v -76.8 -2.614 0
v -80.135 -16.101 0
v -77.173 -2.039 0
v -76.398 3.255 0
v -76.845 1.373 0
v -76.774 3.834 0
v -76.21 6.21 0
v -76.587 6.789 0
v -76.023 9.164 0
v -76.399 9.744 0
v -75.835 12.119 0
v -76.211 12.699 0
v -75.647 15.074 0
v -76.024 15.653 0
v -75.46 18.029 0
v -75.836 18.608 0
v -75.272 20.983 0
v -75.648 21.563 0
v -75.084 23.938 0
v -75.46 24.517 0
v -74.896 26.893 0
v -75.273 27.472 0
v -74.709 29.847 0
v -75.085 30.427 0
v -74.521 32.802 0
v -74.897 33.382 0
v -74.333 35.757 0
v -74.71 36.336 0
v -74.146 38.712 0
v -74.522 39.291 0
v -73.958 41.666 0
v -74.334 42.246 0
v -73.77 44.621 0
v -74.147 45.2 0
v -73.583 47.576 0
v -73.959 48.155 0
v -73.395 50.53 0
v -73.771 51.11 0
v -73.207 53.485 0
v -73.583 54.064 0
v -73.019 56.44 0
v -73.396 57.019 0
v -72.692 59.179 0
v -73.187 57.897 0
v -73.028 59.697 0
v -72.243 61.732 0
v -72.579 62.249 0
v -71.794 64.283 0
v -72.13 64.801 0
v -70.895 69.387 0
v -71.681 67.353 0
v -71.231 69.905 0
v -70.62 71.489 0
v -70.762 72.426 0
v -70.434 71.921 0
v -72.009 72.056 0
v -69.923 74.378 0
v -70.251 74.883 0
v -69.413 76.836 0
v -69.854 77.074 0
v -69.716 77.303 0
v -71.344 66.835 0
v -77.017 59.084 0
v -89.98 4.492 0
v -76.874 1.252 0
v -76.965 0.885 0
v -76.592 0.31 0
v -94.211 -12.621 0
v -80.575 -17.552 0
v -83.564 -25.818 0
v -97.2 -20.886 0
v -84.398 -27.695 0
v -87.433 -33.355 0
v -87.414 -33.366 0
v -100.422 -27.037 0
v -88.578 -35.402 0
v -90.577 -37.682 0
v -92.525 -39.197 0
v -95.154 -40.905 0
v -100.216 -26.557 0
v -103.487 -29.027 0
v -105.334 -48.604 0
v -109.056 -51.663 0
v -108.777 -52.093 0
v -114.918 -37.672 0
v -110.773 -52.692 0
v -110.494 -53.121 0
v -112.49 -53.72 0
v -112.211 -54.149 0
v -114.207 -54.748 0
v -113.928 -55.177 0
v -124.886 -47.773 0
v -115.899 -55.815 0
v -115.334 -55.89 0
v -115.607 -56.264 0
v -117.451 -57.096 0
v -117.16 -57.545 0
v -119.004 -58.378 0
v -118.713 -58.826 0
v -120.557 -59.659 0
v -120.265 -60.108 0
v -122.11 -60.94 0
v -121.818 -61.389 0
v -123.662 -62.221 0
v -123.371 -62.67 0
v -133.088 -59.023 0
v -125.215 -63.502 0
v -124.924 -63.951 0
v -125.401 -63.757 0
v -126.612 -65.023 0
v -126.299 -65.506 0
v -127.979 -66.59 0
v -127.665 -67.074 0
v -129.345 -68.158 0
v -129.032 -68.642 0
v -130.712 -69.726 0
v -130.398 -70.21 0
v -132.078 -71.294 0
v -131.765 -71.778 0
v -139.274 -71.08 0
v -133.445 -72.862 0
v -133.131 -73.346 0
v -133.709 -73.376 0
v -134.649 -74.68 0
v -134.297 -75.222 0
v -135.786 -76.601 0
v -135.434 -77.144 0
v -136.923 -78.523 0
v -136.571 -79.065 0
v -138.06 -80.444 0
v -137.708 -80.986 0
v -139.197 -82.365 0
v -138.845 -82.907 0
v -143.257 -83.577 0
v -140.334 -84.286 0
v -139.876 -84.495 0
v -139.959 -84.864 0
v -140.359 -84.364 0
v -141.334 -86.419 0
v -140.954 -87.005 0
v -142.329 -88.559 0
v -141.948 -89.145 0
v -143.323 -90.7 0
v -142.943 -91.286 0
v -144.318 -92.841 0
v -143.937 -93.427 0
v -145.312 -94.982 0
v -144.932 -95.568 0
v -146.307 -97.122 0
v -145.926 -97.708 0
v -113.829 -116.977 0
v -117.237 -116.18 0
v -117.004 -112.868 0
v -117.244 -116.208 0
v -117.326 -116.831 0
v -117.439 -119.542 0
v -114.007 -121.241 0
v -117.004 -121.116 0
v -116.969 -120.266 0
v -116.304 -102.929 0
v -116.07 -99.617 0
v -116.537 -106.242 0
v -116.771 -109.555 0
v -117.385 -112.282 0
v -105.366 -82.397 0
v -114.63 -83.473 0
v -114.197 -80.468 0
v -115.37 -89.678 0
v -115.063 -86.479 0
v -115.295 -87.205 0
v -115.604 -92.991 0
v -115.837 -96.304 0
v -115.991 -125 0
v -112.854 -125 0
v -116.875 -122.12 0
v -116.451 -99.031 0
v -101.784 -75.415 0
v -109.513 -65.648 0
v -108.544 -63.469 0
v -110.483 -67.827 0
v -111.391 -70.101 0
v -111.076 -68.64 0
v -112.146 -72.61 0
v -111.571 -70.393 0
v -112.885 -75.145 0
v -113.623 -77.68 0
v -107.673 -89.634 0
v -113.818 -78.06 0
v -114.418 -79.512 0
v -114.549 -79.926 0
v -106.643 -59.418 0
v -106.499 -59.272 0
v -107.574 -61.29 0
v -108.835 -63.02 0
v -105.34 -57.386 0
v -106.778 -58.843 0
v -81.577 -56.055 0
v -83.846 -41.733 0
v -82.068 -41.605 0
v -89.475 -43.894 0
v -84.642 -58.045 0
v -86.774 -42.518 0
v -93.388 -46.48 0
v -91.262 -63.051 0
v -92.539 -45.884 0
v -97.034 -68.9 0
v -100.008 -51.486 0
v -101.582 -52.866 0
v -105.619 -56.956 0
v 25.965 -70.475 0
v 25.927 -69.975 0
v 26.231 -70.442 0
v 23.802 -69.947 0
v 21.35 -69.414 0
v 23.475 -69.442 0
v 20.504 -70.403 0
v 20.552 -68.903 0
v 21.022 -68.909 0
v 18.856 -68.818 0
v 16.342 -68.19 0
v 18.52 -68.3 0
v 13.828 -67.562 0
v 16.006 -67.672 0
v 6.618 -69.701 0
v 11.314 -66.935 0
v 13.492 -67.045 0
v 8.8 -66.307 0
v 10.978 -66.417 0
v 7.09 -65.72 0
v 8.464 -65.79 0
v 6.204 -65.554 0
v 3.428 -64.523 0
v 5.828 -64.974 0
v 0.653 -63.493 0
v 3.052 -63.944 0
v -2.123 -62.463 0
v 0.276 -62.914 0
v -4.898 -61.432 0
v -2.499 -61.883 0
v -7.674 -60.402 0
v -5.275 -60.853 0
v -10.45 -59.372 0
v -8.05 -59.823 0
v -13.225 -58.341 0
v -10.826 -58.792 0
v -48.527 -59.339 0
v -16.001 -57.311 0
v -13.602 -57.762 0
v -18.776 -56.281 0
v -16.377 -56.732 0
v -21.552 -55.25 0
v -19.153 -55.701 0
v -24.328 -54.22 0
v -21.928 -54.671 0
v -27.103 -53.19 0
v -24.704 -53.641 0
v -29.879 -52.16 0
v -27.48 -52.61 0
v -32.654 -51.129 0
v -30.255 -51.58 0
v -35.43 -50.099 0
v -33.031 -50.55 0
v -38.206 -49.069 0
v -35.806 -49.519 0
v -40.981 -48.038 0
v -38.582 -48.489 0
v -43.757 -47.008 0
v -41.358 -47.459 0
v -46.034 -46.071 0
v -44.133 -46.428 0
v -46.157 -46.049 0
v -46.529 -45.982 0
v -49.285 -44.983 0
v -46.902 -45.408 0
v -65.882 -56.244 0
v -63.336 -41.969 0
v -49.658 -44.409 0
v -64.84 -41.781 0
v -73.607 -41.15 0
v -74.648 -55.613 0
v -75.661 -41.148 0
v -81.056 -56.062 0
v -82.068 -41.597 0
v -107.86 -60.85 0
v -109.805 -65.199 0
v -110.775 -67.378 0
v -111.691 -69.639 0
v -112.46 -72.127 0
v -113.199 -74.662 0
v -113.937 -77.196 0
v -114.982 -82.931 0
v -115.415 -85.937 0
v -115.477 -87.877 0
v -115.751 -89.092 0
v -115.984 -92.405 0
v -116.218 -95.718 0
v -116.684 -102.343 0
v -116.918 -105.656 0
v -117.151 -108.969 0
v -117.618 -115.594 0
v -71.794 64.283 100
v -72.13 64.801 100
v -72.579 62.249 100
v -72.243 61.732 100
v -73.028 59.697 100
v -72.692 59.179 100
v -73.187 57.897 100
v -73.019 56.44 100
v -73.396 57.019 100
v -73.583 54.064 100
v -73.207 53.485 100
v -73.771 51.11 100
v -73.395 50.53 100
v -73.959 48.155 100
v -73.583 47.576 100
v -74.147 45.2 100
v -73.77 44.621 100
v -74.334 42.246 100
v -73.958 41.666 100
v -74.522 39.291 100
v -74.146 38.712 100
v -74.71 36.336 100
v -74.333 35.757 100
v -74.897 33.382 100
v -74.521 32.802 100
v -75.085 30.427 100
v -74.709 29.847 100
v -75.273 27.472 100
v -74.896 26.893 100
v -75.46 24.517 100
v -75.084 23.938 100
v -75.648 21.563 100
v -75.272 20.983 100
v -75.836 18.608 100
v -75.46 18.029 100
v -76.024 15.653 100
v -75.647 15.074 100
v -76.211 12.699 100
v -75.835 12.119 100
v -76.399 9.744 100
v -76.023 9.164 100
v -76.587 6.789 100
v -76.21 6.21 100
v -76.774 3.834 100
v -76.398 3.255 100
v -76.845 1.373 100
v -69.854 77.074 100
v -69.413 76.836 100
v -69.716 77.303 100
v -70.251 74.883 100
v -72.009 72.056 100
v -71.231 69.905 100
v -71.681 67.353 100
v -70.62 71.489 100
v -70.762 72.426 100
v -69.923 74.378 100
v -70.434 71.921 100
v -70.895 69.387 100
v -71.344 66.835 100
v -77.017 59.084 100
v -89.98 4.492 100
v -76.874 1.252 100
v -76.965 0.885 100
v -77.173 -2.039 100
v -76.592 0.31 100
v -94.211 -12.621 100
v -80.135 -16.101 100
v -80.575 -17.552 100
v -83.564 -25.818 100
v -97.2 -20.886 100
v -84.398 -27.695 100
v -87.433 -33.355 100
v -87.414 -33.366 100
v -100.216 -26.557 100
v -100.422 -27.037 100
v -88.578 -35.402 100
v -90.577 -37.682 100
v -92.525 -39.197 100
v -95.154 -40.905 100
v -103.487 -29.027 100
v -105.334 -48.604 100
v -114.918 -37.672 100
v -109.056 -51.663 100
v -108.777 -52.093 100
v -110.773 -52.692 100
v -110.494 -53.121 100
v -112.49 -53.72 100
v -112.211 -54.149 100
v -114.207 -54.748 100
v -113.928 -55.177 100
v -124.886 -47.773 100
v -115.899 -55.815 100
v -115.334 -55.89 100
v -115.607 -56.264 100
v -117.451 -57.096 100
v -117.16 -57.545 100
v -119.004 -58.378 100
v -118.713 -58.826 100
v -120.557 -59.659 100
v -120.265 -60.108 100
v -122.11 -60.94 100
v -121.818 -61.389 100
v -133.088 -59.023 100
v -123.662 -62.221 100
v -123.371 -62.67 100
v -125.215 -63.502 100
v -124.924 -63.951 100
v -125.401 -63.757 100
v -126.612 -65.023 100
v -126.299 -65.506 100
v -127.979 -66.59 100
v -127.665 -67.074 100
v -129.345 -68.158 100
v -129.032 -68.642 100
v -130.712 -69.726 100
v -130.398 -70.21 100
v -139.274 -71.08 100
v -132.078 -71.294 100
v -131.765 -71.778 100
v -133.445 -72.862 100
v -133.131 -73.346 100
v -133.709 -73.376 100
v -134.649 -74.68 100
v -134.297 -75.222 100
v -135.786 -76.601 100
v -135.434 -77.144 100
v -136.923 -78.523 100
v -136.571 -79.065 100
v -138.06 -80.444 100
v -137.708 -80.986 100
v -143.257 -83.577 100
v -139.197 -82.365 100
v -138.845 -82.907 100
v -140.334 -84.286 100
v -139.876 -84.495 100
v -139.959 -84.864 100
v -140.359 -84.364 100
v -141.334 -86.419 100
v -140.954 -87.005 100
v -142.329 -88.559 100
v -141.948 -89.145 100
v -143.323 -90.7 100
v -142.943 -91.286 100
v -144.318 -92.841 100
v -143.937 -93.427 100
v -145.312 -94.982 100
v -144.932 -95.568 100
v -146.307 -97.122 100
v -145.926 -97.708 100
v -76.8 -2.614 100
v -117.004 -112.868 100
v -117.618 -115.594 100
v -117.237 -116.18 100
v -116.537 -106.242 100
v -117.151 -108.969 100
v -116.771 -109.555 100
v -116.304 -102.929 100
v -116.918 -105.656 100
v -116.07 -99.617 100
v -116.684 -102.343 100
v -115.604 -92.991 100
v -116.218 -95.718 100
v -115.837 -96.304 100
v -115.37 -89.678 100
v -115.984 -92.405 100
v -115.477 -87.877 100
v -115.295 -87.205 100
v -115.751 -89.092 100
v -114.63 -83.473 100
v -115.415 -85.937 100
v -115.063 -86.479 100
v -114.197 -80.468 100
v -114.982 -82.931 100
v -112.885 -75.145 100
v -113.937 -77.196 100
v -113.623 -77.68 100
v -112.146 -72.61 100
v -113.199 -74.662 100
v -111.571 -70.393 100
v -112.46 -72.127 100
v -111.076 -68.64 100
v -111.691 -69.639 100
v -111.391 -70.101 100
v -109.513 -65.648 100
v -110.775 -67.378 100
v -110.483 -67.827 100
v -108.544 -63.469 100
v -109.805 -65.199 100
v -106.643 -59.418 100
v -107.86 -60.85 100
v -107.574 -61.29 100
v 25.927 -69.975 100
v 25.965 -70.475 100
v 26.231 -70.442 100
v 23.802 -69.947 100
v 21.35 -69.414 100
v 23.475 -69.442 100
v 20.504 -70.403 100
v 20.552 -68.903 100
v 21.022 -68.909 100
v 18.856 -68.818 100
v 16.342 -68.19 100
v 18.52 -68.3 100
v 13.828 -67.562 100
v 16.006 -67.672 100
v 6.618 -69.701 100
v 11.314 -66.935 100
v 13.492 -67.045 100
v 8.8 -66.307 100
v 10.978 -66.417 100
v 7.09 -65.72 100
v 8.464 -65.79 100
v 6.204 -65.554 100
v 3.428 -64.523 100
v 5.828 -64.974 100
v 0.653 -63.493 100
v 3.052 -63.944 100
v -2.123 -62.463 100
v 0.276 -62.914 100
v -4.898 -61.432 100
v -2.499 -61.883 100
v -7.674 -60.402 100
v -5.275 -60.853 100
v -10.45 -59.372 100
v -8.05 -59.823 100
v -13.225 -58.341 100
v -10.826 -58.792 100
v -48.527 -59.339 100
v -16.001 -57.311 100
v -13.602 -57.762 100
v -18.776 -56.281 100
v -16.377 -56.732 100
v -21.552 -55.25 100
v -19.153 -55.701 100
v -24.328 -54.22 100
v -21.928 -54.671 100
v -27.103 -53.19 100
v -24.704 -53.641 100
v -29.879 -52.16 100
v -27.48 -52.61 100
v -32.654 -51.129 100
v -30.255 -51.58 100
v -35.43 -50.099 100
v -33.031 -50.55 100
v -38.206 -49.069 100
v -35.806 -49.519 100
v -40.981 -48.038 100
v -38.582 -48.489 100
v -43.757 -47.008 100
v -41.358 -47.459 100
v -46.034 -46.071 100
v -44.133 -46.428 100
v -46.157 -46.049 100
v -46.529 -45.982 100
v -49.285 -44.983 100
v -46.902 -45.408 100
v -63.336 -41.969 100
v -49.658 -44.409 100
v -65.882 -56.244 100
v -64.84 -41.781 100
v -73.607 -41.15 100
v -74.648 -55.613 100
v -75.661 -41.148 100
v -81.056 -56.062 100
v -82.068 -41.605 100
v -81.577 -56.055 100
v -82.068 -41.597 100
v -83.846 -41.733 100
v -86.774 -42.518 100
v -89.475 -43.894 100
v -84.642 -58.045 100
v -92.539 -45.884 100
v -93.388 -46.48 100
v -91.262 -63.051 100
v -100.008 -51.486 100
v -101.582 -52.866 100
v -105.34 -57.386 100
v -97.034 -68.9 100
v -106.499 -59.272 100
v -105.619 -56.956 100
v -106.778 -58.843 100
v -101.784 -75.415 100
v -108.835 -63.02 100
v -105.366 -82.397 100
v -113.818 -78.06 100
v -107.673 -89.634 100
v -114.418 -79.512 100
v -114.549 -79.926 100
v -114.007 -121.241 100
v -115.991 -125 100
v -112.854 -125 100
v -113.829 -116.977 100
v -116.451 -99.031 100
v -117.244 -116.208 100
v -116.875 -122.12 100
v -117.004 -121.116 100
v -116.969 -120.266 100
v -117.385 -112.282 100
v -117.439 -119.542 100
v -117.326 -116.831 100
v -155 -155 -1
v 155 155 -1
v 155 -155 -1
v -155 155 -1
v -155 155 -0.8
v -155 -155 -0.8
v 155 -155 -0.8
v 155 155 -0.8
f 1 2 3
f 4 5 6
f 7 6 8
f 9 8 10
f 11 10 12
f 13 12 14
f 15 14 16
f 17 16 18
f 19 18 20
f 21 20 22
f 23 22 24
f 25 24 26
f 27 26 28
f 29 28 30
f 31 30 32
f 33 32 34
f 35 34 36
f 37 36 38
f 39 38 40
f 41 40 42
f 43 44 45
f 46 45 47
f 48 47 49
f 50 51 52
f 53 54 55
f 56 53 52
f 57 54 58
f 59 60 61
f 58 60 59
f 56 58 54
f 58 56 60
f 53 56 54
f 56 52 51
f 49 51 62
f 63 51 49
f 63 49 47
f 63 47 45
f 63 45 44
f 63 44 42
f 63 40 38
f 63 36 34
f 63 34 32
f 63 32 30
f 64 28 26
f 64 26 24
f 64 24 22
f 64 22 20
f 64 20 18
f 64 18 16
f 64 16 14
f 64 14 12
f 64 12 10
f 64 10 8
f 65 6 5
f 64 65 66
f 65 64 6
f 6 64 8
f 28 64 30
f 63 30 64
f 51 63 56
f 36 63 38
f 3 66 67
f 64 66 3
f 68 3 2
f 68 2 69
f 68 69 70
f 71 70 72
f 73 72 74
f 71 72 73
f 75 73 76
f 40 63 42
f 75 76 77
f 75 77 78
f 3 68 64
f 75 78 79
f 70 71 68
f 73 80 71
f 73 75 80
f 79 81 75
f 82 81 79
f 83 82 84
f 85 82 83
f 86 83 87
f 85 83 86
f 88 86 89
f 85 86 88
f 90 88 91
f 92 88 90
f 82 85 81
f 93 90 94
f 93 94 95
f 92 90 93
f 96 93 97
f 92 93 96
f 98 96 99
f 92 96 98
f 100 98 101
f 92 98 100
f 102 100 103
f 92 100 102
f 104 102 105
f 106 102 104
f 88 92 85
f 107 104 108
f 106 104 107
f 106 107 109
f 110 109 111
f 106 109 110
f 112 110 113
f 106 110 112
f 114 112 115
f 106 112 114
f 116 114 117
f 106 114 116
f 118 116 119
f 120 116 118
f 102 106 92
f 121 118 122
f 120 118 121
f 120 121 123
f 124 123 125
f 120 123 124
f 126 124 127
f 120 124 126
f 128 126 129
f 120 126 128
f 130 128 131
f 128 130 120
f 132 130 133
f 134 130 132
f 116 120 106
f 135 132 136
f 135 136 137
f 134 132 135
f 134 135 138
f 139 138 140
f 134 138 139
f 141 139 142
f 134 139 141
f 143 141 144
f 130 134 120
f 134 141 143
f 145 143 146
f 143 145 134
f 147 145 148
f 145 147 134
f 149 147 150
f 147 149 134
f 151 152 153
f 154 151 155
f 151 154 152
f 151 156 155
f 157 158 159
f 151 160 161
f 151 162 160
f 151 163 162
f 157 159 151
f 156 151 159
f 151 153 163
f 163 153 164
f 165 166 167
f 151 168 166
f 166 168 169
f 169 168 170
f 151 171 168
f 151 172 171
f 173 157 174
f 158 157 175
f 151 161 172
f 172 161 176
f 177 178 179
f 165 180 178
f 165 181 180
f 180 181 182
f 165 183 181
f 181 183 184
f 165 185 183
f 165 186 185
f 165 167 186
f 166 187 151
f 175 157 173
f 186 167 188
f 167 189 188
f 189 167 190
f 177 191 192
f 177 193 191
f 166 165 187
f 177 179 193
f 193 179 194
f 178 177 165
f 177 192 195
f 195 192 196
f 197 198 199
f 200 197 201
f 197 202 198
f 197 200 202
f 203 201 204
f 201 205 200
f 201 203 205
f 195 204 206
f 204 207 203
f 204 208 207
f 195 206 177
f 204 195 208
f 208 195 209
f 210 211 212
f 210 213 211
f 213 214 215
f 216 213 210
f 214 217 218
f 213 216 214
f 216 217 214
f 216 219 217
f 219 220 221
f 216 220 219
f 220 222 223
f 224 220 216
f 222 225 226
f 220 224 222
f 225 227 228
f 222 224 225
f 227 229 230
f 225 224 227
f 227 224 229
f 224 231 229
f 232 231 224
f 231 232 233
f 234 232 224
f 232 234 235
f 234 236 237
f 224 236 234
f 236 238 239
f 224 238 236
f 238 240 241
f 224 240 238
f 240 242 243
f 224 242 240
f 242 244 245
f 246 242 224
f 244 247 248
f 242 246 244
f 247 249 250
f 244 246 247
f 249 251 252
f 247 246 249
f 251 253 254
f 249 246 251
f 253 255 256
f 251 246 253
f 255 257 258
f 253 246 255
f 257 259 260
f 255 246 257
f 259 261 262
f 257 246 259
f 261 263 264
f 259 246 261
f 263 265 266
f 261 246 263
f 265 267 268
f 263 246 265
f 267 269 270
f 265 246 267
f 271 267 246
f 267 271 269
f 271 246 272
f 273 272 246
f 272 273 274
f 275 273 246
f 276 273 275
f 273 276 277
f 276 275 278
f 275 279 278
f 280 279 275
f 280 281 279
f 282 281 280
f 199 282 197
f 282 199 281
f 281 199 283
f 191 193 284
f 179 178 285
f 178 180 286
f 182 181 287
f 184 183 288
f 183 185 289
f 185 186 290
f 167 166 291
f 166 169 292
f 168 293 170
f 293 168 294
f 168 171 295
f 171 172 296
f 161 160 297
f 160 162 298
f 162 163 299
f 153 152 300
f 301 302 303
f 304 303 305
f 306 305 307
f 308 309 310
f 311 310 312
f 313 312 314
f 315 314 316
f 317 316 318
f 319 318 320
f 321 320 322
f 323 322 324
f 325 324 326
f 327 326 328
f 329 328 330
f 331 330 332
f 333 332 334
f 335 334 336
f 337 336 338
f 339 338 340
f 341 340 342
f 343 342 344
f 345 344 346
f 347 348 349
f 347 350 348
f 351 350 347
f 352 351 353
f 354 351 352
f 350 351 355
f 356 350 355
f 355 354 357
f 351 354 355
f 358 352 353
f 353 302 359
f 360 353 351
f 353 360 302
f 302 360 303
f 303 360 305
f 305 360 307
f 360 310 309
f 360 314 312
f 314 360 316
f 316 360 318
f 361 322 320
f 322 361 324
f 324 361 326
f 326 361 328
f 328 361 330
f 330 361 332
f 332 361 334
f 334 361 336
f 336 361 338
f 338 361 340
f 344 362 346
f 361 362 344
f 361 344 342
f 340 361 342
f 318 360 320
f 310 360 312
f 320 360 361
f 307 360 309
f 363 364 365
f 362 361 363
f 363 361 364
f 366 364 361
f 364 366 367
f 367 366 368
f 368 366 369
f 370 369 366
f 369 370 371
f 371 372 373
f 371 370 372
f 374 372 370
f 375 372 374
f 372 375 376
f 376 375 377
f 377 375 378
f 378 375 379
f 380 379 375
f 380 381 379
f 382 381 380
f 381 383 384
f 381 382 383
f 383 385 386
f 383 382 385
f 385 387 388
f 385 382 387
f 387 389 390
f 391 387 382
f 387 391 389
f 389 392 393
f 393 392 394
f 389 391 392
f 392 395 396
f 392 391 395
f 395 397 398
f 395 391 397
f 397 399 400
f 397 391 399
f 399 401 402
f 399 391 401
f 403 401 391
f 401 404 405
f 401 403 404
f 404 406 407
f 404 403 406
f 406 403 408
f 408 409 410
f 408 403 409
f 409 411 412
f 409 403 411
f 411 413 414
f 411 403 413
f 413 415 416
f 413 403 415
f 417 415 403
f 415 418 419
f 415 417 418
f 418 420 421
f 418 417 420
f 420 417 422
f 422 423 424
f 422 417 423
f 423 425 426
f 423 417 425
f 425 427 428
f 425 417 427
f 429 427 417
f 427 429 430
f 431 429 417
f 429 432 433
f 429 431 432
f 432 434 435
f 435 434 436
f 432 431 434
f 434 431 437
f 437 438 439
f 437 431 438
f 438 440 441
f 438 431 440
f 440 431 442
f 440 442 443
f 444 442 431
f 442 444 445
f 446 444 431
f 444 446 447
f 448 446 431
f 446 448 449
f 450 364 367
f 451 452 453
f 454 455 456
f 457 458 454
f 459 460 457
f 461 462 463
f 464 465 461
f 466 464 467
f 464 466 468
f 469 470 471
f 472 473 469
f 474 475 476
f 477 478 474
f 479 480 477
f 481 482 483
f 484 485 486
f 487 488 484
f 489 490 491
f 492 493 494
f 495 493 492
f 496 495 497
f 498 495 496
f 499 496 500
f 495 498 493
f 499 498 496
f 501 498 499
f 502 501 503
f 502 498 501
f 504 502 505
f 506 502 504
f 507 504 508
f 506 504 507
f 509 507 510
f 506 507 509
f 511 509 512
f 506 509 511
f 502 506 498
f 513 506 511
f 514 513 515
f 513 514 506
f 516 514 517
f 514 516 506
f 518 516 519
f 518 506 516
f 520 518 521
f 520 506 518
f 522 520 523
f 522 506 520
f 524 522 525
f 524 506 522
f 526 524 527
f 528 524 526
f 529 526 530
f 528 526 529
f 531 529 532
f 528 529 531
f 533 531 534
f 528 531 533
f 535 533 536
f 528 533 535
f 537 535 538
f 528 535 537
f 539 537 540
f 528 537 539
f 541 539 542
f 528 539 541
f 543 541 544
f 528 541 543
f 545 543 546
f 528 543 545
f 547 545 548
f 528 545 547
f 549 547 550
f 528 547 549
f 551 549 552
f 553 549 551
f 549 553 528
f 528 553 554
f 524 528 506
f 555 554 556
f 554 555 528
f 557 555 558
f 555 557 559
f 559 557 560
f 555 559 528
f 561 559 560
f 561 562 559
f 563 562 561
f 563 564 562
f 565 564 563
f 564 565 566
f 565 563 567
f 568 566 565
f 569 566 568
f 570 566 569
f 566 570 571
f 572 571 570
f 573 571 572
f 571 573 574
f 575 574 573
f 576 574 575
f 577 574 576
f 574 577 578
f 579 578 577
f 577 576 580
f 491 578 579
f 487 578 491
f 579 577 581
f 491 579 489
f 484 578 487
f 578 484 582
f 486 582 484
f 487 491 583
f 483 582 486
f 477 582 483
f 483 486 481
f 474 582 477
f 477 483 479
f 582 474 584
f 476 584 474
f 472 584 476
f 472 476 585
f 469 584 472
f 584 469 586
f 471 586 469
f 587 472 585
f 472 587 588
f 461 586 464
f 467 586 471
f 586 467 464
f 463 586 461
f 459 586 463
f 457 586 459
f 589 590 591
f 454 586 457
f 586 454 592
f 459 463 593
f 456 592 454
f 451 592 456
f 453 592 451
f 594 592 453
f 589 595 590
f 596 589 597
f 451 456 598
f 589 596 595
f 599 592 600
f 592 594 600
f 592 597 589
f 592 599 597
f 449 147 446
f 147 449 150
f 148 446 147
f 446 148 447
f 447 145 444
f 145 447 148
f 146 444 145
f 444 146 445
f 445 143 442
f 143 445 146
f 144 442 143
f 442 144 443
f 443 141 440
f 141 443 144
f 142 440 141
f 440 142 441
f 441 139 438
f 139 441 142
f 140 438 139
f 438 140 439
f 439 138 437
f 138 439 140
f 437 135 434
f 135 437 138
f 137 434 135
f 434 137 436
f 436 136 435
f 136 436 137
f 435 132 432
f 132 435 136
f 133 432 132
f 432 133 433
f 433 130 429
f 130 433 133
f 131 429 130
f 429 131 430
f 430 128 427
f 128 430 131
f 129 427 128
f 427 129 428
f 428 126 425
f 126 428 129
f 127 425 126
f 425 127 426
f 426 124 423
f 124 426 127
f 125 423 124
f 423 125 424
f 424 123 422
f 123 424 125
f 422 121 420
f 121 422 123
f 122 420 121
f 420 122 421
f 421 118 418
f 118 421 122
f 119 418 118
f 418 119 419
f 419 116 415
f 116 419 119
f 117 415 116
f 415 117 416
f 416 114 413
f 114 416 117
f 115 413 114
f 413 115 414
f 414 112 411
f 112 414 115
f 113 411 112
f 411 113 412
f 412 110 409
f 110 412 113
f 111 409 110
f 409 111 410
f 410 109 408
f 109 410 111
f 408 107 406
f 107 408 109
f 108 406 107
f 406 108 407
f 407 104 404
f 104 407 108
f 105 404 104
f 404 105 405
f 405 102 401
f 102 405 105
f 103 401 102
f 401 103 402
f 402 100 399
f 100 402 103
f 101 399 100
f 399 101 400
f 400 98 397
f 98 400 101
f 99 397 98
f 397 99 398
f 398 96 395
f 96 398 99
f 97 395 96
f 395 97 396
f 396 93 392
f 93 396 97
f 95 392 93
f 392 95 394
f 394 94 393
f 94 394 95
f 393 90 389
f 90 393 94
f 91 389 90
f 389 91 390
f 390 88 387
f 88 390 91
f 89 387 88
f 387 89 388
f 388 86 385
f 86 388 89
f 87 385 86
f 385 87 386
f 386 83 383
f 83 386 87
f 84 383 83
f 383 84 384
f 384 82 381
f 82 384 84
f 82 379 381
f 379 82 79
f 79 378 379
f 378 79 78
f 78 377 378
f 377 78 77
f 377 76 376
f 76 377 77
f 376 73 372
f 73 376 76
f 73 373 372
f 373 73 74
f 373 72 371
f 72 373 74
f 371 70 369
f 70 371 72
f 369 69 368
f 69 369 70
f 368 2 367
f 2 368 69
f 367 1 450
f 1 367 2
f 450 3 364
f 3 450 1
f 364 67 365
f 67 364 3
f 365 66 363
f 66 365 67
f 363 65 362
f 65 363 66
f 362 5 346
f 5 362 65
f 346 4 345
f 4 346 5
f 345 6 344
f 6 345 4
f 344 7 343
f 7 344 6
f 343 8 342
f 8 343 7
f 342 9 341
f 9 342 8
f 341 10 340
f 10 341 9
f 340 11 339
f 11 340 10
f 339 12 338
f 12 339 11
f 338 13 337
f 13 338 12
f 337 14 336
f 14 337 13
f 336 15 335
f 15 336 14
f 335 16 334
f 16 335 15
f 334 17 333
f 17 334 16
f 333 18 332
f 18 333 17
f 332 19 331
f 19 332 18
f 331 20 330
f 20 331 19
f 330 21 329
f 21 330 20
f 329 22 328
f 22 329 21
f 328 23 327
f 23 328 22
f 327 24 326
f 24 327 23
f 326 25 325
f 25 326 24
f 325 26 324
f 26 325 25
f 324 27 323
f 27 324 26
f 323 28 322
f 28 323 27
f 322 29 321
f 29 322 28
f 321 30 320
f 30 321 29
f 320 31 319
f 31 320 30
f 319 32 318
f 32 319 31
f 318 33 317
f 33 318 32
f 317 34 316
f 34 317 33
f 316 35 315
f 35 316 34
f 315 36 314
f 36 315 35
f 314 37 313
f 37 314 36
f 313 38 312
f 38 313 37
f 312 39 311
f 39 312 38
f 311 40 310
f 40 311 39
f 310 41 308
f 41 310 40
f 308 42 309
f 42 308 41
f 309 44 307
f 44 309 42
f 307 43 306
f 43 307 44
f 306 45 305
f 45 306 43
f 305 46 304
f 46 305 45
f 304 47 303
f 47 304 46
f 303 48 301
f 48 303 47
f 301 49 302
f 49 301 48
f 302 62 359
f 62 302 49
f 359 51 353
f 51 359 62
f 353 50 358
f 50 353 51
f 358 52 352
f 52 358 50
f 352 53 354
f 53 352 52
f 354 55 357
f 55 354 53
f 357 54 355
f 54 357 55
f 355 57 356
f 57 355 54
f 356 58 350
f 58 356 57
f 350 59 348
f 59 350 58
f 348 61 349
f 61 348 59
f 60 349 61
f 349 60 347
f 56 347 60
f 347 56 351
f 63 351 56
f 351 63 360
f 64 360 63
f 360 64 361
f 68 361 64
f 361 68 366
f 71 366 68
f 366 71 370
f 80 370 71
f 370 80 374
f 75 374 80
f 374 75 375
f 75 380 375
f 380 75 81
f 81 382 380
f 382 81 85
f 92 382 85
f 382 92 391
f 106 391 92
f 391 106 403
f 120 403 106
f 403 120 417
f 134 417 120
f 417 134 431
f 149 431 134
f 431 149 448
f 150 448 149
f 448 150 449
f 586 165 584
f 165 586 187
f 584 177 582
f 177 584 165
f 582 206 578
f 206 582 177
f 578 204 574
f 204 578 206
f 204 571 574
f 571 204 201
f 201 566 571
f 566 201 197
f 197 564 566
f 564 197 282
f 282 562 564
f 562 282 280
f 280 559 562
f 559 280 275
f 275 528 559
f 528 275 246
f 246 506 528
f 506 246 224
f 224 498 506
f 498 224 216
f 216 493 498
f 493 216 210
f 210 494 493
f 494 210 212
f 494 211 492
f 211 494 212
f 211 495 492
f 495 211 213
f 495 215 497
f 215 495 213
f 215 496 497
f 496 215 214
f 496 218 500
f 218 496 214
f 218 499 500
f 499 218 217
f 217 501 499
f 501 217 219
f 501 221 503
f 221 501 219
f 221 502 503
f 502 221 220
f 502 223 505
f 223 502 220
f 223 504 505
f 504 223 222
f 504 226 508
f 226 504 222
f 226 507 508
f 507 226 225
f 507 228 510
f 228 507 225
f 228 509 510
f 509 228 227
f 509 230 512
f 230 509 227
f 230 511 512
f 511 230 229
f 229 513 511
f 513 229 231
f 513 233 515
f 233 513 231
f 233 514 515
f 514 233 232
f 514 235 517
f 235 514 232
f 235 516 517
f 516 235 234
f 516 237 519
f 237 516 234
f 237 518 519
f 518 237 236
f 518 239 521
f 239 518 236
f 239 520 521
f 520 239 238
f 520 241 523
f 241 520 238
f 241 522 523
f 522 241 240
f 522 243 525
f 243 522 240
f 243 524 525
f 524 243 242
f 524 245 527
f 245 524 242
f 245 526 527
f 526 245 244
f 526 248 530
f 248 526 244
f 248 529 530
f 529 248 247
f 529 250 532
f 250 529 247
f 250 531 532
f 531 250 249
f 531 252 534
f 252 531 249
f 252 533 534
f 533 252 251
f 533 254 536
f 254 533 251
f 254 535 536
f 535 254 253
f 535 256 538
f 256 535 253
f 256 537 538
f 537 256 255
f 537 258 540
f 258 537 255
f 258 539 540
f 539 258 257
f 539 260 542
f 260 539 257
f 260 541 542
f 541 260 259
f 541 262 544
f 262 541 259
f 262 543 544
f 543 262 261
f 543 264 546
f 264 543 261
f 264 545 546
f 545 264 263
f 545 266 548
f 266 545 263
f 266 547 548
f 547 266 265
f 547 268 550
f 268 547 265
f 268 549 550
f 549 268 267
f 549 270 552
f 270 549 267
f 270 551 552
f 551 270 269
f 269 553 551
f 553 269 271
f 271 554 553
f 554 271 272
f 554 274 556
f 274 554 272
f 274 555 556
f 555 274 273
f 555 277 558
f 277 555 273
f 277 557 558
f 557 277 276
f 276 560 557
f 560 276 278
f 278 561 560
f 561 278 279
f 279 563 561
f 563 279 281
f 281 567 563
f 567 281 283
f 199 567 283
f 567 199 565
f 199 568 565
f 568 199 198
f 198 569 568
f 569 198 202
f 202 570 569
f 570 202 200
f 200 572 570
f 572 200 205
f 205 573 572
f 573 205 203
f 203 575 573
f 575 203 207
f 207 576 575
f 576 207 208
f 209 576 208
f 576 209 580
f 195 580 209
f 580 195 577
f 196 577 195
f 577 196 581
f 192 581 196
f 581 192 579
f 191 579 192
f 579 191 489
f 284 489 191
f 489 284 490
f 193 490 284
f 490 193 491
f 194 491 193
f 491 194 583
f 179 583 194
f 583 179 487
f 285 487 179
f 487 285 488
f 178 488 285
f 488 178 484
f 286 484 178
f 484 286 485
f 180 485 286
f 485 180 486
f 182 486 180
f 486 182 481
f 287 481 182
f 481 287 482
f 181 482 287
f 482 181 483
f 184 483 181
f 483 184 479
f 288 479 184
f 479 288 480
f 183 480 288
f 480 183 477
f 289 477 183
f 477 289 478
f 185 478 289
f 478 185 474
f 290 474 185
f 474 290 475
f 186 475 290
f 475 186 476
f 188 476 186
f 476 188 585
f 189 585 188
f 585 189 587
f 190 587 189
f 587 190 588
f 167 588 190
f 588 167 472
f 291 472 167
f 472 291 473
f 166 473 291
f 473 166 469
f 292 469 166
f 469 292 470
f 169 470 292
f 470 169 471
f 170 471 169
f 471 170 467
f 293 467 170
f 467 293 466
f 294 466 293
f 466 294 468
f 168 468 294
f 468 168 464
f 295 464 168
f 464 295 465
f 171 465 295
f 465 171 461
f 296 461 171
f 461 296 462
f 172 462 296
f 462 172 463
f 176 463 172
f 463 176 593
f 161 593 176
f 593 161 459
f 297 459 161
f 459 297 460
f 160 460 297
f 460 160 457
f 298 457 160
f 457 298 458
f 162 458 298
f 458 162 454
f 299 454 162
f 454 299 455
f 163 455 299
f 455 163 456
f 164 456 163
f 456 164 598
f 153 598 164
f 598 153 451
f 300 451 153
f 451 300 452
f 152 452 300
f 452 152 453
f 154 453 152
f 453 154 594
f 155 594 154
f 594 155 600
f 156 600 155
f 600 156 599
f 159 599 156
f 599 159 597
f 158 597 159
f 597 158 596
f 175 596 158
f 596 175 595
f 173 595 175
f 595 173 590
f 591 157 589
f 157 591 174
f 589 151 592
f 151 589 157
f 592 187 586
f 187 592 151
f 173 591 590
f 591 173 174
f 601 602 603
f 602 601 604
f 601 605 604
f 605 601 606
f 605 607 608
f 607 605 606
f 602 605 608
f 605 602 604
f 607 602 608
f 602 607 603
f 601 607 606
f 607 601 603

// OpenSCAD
use <paddle.scad>

module paddle_profile(inset) {
  offset(-inset)
  projection() {
    wedge();
    grip();
  }
}

module strake(width, top, bottom) {
  difference() {
    paddle_profile(0);
    paddle_profile(width);
    
    translate([-200, top])
    square(400);
    
    translate([0, -bottom-200])
    square(400, center=true);
  }
}

module strakes_2d() {
  steps = 30;
  for (i = [0:steps-1])
  strake(15*i/steps, 76-53*i/steps, 87-60*i/steps);
}

module preview() {
  color("cyan")
  translate([0, 0, -2])
  linear_extrude(1)
  paddle_profile(0);
  
  strakes_2d();
}

module strakes() {
  linear_extrude(100)
  strakes_2d();
}

module print() {
  color("cyan")
  positioning_square();

  difference() {
    print_position()
    strakes();
    
    // Don't add any material to the hooked part; it is not under
    // high stress.
    translate([0, -325, -1])
    linear_extrude(110)
    square(400, center=true);
  }
}

print();
